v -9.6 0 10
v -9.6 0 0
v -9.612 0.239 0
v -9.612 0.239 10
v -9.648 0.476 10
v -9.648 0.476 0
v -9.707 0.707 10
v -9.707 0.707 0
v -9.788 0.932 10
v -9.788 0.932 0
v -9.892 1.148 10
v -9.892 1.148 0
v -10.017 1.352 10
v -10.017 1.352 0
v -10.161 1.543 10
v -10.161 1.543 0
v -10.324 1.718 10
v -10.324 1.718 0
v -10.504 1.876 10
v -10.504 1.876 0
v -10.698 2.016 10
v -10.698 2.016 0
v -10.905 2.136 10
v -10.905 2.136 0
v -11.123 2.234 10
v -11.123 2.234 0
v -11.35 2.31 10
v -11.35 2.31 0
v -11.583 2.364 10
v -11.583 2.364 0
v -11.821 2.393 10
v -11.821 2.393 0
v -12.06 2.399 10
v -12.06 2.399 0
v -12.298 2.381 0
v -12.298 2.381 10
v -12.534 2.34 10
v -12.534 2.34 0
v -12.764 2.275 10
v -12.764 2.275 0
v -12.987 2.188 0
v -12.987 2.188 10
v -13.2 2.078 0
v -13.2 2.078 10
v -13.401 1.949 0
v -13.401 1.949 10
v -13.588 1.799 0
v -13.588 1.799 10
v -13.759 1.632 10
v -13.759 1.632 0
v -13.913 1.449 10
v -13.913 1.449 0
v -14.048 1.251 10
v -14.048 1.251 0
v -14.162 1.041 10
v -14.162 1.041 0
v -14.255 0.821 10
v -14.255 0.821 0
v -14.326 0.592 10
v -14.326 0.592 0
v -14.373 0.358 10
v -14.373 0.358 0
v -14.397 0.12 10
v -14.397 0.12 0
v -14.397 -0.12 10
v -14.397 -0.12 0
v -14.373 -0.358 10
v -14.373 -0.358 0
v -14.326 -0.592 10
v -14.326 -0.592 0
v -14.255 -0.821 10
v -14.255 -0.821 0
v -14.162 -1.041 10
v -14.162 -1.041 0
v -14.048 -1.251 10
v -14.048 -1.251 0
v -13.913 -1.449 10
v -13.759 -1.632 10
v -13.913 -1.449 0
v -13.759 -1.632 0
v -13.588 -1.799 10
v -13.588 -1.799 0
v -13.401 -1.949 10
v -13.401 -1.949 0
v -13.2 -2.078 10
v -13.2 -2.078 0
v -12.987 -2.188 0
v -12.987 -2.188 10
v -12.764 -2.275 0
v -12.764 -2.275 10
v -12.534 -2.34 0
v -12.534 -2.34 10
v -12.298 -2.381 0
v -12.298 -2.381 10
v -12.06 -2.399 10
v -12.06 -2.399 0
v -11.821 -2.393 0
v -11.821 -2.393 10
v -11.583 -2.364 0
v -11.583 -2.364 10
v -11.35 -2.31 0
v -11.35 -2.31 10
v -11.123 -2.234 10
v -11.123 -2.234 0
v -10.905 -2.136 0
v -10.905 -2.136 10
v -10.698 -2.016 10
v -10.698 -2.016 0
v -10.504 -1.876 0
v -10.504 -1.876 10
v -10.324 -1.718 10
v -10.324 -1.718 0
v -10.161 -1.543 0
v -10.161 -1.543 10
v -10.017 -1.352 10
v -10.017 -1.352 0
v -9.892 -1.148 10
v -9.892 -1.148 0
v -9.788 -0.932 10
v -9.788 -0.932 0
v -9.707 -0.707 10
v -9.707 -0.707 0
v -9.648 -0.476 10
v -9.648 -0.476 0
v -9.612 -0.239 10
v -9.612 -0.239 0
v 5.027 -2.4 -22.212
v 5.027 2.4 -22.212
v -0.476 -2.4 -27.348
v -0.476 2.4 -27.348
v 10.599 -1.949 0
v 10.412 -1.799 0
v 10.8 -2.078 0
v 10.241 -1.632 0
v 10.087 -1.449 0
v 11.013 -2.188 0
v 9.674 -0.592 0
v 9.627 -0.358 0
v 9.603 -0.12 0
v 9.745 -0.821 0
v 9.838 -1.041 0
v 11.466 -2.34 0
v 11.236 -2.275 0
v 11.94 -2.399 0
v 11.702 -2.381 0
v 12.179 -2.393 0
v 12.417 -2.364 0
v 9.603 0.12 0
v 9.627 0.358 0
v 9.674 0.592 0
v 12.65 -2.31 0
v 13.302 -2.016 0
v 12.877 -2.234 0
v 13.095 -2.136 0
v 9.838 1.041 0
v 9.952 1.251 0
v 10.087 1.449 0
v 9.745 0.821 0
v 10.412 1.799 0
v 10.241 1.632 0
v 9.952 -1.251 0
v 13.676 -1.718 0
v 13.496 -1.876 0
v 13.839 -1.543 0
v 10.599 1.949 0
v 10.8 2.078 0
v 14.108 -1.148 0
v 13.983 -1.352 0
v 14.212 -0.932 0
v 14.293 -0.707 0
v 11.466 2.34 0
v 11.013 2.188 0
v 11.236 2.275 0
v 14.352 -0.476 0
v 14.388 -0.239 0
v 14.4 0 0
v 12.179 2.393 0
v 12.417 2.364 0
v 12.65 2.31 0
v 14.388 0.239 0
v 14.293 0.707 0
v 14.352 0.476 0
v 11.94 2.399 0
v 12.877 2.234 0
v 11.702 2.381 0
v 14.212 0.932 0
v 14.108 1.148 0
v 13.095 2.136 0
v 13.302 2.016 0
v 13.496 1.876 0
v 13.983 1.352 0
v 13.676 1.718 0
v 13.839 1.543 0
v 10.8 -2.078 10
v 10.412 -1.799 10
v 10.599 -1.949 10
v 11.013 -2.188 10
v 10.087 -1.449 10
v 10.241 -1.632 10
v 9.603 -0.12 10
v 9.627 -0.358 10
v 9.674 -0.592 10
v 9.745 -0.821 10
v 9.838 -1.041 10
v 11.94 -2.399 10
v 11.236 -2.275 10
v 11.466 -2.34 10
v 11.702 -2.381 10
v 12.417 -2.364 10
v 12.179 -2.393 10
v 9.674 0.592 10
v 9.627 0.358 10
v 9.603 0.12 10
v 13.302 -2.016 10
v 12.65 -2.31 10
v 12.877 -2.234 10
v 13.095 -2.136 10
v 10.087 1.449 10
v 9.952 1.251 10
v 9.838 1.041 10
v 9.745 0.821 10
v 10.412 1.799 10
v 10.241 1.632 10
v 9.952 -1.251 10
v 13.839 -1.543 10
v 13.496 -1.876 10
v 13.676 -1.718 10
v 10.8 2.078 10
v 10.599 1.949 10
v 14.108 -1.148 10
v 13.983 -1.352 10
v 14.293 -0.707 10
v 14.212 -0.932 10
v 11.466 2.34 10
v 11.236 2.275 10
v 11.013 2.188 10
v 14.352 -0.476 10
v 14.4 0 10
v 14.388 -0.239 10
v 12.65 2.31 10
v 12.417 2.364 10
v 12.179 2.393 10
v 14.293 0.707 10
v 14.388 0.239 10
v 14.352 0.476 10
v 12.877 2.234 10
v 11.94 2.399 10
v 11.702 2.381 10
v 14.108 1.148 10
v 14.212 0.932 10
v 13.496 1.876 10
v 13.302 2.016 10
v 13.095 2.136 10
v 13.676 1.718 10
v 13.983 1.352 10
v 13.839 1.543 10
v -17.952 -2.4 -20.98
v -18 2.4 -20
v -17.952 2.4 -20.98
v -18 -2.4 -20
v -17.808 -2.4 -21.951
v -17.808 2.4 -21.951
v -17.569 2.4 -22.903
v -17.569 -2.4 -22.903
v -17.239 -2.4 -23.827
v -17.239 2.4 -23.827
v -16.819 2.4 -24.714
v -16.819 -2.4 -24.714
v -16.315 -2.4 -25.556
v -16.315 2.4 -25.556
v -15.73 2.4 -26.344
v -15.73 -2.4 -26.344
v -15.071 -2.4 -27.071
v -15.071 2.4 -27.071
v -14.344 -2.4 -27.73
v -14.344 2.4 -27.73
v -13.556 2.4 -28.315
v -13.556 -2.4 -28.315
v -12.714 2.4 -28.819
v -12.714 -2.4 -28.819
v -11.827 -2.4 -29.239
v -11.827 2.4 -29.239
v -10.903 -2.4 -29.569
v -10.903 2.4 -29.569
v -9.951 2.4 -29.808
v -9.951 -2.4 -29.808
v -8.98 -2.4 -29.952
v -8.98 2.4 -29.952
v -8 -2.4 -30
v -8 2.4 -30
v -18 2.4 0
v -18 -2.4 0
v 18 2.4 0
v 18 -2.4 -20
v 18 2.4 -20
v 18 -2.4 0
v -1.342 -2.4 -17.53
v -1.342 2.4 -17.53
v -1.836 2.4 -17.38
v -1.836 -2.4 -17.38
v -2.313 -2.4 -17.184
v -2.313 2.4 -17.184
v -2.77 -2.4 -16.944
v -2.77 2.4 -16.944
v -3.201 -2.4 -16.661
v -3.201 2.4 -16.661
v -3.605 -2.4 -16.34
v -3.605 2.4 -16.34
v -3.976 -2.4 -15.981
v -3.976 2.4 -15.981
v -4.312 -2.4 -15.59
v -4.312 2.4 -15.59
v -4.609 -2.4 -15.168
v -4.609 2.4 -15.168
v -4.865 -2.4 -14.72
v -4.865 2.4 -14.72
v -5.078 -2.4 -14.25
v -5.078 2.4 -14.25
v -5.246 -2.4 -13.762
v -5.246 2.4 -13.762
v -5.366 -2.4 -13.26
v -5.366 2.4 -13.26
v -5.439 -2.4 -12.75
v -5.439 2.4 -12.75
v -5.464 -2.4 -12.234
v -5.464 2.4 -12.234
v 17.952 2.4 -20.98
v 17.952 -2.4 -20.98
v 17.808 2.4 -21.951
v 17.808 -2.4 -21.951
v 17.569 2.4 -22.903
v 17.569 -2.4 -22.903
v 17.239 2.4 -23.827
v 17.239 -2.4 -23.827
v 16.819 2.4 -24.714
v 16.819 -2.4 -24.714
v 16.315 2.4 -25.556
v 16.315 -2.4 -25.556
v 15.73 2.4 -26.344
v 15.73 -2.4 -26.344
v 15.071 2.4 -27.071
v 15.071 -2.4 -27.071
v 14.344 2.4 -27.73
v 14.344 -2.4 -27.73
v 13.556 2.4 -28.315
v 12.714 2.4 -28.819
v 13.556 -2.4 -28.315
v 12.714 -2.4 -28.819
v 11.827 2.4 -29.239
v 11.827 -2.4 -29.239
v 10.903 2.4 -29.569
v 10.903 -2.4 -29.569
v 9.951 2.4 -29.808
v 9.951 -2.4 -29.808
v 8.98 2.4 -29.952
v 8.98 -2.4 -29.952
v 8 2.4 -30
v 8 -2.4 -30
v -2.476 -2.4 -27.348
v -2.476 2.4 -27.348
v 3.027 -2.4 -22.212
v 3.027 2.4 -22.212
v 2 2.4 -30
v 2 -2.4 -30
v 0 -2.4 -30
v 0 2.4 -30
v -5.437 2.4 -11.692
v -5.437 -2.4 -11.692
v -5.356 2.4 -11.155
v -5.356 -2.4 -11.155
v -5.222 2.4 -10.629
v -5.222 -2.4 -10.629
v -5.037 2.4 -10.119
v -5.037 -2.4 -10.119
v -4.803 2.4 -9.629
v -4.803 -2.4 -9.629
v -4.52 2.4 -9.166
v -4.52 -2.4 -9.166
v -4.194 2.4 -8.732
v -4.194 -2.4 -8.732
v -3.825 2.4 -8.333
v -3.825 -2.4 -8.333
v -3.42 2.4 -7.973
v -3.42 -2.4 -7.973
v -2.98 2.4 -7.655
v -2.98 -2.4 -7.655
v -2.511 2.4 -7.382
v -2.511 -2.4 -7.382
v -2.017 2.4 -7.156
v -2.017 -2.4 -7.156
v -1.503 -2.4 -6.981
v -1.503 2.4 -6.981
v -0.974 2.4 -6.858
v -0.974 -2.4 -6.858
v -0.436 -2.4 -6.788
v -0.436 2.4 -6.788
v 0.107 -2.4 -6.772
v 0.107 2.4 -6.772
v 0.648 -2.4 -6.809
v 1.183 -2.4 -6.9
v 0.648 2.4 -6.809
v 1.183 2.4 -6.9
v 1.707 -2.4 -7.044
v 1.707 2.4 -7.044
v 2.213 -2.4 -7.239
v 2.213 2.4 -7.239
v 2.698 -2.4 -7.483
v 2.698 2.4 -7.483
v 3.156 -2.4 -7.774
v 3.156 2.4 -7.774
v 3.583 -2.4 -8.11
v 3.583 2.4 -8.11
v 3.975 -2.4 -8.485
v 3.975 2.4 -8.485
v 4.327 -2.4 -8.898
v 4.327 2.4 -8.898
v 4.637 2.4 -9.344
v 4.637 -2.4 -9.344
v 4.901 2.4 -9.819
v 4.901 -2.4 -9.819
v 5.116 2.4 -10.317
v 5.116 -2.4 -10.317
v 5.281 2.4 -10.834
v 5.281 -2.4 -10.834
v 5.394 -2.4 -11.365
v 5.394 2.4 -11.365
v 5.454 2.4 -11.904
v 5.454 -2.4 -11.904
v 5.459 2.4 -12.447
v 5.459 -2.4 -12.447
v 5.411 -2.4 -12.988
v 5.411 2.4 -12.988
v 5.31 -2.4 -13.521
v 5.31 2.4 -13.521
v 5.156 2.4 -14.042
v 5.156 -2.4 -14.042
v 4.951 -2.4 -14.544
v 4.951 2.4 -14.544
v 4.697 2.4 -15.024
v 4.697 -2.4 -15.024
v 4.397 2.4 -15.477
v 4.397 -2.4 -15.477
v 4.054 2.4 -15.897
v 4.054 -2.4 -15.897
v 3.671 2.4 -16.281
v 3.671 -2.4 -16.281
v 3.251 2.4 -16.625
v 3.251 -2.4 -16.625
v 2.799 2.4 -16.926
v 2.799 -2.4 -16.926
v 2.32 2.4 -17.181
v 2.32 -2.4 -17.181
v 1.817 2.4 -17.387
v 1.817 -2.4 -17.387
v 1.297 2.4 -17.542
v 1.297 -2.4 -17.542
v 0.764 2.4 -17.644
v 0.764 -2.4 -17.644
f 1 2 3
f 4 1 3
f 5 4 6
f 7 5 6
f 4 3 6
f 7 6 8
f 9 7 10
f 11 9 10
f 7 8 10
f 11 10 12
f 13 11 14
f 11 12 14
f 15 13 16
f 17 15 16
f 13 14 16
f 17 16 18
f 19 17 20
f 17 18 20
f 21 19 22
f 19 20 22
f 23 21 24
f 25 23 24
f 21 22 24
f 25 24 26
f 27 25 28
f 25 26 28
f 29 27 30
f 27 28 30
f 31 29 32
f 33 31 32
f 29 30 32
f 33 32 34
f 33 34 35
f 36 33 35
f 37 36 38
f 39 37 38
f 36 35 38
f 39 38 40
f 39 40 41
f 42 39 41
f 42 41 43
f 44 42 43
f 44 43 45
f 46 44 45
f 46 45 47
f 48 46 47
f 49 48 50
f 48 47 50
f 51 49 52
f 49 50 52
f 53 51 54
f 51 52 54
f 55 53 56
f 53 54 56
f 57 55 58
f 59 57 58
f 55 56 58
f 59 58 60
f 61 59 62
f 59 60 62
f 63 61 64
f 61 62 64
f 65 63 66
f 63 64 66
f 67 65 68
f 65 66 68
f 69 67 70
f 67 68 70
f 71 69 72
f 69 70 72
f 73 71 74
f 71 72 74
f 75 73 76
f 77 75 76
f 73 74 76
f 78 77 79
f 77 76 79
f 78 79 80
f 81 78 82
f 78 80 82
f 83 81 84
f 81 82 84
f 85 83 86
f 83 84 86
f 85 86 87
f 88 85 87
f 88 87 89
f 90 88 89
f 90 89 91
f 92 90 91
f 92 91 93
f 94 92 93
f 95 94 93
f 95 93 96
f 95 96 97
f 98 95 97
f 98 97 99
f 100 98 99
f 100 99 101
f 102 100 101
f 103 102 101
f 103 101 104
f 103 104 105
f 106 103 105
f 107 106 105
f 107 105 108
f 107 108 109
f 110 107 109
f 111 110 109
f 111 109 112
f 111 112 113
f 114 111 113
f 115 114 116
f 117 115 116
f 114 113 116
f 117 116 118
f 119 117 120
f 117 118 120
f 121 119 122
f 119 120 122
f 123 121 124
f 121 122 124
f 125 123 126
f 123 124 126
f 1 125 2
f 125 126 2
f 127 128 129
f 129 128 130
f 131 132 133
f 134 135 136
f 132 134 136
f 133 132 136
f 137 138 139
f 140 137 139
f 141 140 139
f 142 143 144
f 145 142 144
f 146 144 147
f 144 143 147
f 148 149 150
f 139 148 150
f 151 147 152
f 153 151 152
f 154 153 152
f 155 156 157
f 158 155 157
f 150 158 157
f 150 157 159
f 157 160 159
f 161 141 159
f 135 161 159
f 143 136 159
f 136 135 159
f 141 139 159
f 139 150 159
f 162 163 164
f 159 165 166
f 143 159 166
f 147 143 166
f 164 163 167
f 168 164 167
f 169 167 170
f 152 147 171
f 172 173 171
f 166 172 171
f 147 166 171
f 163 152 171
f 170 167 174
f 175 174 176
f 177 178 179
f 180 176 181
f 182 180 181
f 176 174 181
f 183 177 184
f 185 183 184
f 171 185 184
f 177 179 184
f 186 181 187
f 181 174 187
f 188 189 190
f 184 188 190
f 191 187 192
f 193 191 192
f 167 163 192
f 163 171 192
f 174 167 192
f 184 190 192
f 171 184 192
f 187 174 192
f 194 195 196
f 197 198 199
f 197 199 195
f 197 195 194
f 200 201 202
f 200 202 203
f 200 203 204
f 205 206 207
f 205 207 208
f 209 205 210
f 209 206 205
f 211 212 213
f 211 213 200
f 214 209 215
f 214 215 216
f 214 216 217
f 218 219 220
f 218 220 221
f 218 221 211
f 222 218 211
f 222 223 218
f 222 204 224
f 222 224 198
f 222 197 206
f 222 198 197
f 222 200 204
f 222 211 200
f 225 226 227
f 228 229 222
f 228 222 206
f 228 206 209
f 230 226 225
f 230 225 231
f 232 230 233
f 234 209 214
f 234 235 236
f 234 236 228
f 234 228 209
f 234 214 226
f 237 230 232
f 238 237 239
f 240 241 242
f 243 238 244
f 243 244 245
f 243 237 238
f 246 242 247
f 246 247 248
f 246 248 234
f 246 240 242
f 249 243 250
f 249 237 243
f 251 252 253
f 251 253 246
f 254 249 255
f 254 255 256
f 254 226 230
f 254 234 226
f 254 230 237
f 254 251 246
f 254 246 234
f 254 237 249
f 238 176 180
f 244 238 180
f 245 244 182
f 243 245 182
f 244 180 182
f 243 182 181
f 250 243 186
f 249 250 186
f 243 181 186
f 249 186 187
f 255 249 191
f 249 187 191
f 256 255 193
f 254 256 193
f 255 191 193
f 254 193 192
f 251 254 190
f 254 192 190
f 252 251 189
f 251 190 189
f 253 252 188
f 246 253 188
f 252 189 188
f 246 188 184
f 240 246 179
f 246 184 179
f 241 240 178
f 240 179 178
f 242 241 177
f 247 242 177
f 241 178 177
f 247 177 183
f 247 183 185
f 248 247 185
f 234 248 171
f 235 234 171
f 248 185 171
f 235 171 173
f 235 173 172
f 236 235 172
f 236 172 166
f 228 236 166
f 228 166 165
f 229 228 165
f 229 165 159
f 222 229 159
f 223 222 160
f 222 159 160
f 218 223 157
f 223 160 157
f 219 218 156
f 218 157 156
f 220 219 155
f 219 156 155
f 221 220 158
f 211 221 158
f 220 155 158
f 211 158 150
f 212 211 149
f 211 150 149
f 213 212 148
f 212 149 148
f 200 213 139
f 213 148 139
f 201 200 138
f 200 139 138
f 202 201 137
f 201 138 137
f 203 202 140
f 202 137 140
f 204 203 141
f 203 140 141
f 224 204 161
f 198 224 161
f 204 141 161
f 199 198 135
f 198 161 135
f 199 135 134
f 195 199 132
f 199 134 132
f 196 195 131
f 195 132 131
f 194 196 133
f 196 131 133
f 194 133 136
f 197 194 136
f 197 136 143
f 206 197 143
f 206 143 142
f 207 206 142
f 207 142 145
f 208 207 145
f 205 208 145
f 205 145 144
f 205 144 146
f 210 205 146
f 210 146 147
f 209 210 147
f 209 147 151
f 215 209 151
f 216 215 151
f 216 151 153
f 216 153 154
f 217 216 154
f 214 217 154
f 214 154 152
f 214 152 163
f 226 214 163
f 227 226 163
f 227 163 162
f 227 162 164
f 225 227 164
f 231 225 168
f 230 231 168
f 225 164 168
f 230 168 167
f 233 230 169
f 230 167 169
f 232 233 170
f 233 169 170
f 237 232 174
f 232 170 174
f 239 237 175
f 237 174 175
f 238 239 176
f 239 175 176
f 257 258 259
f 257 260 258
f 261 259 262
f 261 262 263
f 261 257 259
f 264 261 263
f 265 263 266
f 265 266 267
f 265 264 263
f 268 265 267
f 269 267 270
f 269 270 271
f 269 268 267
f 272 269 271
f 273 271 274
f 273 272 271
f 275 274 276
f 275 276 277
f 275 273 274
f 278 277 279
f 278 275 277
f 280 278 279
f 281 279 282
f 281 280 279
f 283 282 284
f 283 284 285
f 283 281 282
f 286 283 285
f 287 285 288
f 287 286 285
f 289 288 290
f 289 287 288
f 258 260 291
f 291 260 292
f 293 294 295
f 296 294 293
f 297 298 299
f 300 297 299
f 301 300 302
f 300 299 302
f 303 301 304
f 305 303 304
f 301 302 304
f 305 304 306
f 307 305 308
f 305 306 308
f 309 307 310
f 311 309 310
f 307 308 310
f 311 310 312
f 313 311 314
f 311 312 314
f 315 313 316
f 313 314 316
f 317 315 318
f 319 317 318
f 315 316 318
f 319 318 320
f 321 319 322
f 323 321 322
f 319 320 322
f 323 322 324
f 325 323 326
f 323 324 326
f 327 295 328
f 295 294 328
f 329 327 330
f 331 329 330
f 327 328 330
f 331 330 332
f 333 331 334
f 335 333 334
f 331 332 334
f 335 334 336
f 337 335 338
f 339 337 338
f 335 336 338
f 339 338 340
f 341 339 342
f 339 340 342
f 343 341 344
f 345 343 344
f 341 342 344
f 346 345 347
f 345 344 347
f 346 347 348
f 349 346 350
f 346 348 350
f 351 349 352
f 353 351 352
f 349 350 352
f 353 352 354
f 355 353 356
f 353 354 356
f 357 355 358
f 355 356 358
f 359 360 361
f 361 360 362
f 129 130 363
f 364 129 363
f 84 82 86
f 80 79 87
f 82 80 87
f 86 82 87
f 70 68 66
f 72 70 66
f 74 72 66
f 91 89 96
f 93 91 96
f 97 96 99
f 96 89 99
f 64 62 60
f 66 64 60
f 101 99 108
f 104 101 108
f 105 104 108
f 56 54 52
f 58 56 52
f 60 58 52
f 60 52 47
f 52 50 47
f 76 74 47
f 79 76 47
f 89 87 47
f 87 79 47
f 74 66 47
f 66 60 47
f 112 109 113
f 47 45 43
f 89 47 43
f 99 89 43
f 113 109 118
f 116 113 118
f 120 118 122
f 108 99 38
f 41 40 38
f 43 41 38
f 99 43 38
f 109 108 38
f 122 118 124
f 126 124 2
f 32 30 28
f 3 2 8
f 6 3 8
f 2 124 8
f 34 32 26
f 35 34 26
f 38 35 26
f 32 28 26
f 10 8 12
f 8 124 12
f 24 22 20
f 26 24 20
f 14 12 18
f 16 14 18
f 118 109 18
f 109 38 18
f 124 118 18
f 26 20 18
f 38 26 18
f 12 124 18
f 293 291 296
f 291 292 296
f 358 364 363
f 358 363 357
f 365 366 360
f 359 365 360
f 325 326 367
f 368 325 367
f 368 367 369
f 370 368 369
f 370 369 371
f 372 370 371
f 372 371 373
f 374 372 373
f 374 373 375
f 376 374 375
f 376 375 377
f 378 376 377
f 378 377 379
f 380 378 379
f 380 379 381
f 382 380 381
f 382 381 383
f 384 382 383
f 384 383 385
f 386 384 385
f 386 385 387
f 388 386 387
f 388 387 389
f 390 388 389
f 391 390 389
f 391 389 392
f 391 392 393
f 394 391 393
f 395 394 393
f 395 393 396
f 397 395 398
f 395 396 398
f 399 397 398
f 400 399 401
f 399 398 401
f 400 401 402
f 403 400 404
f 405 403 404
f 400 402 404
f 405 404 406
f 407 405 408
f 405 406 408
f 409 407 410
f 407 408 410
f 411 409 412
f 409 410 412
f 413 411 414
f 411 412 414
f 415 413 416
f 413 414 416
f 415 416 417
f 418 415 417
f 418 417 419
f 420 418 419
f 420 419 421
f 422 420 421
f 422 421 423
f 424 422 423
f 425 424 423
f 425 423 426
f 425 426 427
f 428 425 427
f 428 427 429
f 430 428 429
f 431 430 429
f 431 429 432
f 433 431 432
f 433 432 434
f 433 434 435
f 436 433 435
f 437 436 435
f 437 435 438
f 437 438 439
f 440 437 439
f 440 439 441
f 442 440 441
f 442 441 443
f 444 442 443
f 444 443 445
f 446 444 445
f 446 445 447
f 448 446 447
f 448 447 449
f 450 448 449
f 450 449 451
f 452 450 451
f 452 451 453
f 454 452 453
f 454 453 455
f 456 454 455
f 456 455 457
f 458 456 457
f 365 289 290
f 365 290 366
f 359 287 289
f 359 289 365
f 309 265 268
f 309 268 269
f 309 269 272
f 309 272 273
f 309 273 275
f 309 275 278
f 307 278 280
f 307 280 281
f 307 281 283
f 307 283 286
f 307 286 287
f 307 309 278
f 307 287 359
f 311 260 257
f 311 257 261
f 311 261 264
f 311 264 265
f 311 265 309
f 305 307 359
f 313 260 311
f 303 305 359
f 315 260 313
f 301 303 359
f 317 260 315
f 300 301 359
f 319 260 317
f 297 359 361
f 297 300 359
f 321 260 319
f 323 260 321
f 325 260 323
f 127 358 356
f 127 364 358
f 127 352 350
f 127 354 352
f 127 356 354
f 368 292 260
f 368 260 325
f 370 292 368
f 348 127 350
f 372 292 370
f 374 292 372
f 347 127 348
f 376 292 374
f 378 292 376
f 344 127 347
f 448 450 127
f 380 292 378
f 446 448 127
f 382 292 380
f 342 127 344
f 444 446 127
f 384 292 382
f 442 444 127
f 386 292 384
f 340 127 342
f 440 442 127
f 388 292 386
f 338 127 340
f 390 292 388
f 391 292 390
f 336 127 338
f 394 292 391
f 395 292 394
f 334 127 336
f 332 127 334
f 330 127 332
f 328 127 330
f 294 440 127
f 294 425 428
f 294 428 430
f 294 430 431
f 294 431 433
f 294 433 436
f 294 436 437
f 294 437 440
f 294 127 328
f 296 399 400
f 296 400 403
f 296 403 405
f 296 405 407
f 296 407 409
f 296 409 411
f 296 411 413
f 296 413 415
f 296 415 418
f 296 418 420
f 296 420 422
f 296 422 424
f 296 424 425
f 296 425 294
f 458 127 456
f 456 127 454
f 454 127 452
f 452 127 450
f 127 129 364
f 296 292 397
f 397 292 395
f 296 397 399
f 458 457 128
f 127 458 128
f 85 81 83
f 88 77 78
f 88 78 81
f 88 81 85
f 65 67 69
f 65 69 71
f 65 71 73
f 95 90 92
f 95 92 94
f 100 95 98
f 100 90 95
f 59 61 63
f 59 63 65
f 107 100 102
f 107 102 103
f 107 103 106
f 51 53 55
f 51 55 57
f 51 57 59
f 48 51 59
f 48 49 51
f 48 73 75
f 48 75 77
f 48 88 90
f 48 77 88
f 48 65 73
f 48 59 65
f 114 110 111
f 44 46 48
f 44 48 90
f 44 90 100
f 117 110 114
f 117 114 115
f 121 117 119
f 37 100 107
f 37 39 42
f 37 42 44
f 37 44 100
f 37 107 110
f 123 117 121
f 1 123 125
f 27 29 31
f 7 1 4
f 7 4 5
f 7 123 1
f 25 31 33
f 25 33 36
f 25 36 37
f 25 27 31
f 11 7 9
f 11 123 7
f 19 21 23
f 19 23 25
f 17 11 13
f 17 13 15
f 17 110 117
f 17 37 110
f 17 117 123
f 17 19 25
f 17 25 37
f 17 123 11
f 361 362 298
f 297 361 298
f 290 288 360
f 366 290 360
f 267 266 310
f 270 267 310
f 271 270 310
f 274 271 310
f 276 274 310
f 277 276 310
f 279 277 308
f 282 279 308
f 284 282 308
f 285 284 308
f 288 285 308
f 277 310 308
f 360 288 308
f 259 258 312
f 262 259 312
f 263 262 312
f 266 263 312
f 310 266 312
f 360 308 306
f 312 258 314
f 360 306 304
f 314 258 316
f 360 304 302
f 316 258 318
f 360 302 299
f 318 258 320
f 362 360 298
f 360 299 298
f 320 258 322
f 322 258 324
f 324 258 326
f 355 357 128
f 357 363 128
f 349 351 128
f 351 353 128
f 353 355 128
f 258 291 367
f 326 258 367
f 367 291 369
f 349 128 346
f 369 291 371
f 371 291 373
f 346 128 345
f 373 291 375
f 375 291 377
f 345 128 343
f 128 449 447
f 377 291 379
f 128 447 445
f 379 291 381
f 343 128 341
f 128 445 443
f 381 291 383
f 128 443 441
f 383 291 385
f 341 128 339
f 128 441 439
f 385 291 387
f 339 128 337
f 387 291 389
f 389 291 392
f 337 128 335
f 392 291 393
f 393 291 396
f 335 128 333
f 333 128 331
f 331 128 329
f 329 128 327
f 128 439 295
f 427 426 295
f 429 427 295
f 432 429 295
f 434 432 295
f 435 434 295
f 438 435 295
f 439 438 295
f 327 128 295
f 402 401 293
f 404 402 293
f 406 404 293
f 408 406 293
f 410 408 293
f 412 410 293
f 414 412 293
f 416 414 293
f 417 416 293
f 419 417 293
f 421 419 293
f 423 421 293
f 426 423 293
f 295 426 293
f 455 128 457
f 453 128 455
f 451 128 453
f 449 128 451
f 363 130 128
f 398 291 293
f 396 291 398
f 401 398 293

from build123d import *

# Parameters (mm, degrees)
F0_R     = 2.4
F1_DEPTH = 10
F2_W     = 36
F2_H     = 30
F3_DEPTH = 2.4
F4_R     = 10
F6_DEPTH = 25


with BuildPart() as f1:
    # F0 (on Top) → F1 (new body)
    with BuildSketch(Plane.XY):
        with Locations((-12, 0)):
            Circle(F0_R)
        with Locations((12, 0)):
            Circle(F0_R)
    extrude(amount=F1_DEPTH)


with BuildPart() as f3:
    # F2 (on Front) → F3 (new body, symmetric)
    with BuildSketch(Plane.XZ):
        with Locations((0, -15)):
            Rectangle(F2_W, F2_H)
    extrude(amount=F3_DEPTH, both=True)

    # F4
    f4_edges = [f3.edges().sort_by_distance(p)[0] for p in [
        (18, 0, -30),
        (-18, 0, -30),
    ]]
    fillet(f4_edges, radius=F4_R)

    # F5 (on face) → F6 (cut)
    with BuildSketch(Plane(origin=(0, 2.4, 0), x_dir=(-1, 0, 0), z_dir=(0, 1, 0))):
        with BuildLine():
            ThreePointArc((1.342098, -17.530336), (4.311805, -15.589608), (5.463577, -12.234163))
            ThreePointArc((5.463577, -12.234163), (-3.583035, -8.109539), (-0.764039, -17.644054))
            ThreePointArc((-0.764039, -17.644054), (0.294569, -17.689794), (1.342098, -17.530336))
        make_face()
        with BuildLine():
            ThreePointArc((1.342098, -17.530336), (0.294569, -17.689794), (-0.764039, -17.644054))
            Line((-0.764039, -17.644054), (-5.027231, -22.21176))
            Line((-5.027231, -22.21176), (0.475518, -27.347659))
            Line((0.475518, -27.347659), (-2, -30))
            Line((-2, -30), (0, -30))
            Line((0, -30), (2.475518, -27.347659))
            Line((2.475518, -27.347659), (-3.027231, -22.21176))
            Line((-3.027231, -22.21176), (1.342098, -17.530336))
        make_face()
    extrude(amount=-F6_DEPTH, mode=Mode.SUBTRACT)


solid = Compound([f1.part, f3.part])
